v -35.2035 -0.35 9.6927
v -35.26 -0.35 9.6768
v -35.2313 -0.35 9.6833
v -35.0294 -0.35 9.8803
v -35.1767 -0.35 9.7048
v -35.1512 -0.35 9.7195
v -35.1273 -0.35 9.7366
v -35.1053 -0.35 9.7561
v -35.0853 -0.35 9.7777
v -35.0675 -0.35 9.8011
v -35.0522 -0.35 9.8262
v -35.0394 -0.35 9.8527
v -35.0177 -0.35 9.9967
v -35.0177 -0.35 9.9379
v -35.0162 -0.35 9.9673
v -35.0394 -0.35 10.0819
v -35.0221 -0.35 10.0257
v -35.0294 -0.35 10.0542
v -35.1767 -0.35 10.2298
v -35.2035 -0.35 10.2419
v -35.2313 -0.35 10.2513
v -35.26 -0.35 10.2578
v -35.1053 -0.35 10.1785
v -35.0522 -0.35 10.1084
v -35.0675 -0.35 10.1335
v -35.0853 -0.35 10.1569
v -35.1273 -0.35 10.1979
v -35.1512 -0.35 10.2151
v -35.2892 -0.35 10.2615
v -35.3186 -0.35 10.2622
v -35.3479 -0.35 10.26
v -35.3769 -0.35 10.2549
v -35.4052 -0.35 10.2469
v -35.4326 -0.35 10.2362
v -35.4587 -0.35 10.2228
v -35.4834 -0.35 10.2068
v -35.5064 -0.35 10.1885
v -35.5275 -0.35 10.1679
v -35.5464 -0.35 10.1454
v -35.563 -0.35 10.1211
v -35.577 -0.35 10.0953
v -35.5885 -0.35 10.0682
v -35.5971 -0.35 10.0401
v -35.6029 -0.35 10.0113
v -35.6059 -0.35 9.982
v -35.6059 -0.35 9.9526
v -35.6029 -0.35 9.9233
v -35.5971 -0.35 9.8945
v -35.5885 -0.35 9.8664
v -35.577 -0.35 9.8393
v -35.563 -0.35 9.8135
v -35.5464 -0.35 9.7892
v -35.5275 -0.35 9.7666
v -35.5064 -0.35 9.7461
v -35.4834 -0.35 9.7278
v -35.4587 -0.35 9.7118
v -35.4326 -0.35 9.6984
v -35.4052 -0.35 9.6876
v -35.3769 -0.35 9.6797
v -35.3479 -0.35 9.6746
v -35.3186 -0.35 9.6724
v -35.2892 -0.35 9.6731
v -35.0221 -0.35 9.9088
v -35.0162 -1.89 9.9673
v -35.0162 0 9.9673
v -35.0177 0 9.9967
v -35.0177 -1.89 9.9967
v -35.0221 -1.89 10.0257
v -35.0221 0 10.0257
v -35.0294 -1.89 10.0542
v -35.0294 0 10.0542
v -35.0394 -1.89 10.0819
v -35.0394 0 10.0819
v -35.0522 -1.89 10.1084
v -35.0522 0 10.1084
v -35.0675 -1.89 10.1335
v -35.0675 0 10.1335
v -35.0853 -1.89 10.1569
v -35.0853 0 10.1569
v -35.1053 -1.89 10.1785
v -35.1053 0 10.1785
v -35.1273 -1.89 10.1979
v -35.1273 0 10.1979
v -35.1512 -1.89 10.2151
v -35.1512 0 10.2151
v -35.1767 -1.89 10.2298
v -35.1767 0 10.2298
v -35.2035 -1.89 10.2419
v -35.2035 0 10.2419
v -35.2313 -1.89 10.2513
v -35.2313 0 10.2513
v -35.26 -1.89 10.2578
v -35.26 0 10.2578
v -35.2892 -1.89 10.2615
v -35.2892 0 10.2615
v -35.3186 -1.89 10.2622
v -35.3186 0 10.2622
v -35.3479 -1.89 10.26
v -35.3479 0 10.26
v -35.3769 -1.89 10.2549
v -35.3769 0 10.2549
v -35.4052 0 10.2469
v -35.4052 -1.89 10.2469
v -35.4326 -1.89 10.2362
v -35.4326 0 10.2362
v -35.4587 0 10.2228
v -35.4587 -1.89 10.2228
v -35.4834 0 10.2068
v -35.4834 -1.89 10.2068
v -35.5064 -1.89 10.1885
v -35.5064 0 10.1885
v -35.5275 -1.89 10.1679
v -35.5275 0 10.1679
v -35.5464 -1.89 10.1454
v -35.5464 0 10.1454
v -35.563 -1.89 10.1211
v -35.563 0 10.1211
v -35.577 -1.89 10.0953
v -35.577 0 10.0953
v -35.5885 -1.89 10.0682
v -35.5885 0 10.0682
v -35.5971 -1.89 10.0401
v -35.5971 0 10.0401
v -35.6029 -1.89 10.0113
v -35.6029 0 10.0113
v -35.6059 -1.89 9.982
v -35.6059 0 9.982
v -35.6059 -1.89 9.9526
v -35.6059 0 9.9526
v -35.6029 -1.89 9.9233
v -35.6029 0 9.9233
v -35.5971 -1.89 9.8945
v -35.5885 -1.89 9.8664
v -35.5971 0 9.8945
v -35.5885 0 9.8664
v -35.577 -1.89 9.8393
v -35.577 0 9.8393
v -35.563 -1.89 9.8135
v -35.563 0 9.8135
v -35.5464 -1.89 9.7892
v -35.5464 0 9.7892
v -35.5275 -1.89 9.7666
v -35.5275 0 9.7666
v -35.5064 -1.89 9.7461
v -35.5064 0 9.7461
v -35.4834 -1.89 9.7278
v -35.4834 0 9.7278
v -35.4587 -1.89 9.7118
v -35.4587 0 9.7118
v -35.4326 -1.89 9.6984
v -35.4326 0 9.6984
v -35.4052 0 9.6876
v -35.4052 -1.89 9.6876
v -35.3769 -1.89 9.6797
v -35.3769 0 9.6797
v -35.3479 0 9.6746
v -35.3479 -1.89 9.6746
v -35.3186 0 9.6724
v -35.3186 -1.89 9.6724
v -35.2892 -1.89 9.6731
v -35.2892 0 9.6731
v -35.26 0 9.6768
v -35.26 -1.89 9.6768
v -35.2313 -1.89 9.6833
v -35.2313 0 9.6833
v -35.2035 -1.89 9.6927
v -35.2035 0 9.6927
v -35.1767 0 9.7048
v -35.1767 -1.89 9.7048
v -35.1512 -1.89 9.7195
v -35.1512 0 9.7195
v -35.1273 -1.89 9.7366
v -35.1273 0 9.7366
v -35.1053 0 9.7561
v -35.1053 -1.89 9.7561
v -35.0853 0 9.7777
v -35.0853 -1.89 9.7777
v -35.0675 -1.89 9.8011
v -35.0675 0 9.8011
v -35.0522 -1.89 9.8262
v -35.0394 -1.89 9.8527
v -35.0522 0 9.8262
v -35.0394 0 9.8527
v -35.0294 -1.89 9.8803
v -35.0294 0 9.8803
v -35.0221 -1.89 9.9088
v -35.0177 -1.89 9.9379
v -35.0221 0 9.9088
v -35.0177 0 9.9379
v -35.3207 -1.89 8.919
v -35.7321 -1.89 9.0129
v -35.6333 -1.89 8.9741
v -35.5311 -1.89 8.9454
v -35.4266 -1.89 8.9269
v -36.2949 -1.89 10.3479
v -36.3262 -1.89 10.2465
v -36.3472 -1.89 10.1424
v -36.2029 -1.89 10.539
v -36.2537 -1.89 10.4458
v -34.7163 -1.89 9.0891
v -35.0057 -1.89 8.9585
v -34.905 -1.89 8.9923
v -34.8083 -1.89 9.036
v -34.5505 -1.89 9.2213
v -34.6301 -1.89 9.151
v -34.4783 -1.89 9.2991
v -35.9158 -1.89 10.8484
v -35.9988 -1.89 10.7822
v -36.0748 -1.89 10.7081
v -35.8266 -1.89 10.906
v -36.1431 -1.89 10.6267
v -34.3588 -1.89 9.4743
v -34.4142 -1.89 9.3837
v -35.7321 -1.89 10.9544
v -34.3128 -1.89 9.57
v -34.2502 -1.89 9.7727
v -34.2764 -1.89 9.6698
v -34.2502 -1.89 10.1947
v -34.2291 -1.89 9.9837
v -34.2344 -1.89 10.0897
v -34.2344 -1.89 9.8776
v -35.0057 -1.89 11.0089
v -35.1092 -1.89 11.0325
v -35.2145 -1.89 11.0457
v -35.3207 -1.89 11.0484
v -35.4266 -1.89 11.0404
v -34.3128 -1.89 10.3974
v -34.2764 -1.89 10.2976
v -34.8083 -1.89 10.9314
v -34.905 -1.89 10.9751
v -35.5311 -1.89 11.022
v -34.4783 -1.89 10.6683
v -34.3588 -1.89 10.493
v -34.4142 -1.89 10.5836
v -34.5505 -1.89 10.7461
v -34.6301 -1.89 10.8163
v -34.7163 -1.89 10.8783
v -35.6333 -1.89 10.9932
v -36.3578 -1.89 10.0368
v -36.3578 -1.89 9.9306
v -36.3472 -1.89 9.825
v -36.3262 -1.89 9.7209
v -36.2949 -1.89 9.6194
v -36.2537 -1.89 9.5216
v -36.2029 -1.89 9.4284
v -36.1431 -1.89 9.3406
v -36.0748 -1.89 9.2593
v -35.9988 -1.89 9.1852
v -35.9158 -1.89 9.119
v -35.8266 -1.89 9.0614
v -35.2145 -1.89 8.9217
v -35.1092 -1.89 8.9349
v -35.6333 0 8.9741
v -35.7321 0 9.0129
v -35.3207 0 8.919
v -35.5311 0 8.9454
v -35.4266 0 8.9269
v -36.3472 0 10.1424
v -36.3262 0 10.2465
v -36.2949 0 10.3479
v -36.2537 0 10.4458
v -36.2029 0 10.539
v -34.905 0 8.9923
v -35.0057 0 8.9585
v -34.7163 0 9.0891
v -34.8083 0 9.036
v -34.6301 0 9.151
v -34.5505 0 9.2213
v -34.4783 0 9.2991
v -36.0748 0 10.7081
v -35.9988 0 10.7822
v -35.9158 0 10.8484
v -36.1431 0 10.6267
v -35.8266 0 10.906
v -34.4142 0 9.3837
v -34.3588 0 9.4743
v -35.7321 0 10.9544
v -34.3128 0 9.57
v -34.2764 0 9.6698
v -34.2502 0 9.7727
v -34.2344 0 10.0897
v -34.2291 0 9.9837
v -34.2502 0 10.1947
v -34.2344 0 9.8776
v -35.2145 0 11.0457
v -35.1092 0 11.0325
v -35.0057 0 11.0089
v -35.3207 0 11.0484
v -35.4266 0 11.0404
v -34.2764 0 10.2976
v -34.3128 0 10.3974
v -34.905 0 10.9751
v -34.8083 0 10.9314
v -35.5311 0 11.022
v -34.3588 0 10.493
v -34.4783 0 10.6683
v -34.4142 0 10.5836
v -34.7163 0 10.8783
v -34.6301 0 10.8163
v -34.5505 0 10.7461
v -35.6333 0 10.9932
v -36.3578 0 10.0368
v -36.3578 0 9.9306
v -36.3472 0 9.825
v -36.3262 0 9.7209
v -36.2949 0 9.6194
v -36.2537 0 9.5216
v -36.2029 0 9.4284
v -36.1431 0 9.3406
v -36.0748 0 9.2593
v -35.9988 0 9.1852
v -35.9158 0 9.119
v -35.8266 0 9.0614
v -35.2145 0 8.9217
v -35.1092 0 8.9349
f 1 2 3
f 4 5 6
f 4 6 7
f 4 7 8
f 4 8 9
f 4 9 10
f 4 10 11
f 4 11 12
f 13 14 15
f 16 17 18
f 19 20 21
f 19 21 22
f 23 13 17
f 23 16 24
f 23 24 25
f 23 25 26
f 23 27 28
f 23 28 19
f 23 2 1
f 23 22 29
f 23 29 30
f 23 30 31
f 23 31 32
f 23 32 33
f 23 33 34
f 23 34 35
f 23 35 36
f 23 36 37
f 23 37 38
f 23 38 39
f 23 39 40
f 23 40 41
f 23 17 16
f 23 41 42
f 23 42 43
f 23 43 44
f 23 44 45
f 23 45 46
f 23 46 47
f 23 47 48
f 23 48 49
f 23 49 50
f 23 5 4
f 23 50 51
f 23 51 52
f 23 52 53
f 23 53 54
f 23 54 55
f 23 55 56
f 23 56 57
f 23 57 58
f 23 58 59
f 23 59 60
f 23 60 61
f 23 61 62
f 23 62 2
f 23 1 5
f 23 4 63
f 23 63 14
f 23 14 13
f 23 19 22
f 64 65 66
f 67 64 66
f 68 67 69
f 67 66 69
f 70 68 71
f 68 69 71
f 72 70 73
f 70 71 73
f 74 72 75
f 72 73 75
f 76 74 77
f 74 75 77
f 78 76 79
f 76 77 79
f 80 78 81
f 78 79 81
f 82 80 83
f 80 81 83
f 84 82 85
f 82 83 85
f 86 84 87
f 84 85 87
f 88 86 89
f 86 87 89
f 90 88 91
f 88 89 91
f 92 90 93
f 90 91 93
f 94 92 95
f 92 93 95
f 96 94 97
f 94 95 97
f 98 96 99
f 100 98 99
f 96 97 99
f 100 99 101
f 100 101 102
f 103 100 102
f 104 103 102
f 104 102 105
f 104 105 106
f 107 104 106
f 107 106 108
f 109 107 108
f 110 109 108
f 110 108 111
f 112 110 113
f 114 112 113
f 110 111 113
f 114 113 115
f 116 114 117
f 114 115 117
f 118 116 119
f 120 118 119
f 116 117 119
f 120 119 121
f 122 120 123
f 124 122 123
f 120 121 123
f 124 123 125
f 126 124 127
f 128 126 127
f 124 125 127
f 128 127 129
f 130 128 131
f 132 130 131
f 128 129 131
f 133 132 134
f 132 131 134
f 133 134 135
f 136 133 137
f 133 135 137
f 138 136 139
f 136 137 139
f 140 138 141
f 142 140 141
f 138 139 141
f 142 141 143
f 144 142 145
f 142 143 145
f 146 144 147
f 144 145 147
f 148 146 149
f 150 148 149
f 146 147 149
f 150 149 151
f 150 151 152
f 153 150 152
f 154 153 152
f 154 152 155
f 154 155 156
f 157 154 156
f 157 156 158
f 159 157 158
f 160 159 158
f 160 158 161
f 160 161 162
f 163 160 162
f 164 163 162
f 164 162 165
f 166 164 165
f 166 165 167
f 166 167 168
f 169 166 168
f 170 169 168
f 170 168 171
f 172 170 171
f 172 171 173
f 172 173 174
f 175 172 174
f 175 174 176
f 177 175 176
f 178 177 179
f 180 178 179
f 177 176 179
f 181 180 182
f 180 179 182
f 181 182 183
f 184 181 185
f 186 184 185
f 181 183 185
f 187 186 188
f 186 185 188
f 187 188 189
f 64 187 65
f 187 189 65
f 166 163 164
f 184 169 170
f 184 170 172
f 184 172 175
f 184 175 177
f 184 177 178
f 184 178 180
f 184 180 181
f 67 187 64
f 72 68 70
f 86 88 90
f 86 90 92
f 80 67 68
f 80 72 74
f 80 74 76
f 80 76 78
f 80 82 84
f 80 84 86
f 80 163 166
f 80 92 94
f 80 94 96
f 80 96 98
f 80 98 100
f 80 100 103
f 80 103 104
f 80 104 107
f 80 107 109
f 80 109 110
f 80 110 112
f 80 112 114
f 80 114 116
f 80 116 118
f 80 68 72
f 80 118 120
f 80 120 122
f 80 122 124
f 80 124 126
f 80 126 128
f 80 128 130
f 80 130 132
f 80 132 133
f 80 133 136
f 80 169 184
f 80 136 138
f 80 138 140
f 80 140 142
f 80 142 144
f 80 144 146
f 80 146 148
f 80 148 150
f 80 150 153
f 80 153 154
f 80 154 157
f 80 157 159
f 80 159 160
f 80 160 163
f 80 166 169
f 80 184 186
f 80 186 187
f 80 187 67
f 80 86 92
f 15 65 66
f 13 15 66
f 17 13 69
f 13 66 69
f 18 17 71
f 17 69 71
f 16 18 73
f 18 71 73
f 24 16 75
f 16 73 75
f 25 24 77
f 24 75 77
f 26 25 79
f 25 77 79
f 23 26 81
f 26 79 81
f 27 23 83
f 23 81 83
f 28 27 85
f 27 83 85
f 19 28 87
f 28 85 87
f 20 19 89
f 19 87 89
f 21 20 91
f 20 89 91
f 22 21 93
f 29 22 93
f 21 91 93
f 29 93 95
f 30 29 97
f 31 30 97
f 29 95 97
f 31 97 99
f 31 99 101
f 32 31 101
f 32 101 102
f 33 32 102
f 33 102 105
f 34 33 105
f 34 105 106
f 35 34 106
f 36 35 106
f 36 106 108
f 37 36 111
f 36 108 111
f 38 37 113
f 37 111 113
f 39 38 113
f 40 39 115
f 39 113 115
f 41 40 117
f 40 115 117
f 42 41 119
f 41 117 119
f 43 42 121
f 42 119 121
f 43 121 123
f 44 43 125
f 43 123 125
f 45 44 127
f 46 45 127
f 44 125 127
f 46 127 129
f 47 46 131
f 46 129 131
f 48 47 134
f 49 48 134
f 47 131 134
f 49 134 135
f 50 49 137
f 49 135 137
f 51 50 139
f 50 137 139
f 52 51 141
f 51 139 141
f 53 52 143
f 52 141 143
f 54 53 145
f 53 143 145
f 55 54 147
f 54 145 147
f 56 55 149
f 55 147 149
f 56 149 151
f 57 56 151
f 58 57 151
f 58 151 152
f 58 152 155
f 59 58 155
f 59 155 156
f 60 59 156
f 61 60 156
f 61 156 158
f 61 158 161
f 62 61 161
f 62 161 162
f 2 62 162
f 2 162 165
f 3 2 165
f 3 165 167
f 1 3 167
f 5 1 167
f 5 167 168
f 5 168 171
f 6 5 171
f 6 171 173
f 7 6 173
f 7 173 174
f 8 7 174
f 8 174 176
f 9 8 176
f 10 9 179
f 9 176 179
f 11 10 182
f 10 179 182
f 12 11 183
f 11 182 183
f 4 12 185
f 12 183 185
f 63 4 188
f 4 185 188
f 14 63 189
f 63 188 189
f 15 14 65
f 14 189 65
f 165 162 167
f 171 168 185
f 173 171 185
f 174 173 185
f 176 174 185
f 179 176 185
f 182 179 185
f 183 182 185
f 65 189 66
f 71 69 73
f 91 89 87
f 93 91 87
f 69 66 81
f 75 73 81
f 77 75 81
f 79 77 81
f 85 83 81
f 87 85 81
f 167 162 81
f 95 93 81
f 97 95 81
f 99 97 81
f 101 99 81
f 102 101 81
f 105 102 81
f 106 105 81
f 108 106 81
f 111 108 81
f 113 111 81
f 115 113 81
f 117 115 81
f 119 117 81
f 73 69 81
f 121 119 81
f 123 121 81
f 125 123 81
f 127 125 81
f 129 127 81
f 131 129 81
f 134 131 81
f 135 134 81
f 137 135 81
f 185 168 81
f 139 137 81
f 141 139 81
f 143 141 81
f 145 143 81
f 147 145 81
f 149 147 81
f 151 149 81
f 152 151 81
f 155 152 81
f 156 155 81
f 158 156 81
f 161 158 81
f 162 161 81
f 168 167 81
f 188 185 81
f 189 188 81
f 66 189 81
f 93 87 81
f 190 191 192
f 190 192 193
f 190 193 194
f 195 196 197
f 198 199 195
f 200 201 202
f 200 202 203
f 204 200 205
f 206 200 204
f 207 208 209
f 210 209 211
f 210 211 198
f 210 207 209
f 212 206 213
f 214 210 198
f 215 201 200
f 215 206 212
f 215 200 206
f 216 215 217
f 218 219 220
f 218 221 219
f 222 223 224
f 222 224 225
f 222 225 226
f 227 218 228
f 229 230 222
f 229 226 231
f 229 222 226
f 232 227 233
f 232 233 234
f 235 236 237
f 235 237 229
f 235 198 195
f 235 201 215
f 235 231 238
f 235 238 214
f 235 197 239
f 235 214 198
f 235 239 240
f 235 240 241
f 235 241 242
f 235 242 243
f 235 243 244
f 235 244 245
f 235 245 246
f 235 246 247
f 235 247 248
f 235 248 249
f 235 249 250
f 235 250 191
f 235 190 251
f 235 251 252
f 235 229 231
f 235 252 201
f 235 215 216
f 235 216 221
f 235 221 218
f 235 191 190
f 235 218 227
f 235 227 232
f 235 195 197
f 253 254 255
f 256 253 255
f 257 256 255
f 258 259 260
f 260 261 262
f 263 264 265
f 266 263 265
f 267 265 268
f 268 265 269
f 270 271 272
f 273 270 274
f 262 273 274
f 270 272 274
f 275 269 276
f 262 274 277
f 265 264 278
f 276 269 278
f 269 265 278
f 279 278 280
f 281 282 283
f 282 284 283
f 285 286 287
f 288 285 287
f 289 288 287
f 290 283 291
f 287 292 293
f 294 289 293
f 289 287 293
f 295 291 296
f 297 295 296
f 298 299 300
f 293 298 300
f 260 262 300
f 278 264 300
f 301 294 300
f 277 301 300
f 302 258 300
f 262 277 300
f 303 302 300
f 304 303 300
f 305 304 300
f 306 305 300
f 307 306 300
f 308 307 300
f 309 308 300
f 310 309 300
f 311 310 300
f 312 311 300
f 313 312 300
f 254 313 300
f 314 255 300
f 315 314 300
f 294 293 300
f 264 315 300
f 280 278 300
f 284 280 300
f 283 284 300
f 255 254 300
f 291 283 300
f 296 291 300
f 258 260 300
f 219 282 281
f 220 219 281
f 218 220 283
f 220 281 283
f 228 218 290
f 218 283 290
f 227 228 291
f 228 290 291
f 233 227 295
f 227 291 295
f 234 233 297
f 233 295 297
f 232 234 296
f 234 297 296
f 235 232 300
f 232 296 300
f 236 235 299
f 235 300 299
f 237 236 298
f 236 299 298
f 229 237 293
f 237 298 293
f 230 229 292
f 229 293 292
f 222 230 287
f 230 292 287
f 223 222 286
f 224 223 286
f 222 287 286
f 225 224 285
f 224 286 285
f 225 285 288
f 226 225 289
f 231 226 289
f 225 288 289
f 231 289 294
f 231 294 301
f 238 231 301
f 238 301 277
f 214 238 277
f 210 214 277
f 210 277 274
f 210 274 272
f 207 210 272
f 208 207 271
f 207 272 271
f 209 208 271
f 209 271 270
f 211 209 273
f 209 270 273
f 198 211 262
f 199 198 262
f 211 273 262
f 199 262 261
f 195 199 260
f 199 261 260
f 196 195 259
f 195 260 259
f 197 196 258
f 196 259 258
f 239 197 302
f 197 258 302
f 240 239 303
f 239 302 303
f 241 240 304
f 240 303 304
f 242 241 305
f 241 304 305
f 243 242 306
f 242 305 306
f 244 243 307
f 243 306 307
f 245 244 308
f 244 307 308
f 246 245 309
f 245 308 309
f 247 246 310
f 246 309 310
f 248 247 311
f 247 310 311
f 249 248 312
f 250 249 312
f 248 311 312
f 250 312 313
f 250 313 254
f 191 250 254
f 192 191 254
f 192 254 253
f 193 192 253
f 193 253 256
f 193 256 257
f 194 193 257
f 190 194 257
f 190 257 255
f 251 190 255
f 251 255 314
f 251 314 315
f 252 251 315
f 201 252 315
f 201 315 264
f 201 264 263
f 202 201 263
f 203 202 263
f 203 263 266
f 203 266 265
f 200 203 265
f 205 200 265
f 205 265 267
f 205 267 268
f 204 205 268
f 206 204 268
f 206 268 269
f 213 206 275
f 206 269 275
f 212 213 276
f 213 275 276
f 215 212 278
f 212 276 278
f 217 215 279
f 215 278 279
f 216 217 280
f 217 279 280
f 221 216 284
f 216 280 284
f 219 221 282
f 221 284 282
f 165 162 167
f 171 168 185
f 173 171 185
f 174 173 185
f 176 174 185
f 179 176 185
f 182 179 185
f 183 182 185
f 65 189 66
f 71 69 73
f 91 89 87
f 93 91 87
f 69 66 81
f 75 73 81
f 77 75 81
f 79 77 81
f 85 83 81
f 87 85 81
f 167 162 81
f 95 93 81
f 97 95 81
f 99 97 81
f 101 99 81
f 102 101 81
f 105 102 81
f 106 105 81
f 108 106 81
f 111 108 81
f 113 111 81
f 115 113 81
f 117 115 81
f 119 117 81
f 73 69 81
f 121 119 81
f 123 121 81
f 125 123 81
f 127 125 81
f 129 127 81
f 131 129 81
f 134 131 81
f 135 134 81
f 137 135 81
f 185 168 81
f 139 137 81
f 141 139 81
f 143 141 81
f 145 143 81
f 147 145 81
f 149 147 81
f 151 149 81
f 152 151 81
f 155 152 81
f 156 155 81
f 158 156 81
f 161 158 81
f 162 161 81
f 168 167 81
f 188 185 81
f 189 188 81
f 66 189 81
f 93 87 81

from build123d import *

# Parameters (mm, degrees)
F1_R     = 0.295
F2_DEPTH = 1.89
F0_R     = 1.065
F3_DEPTH = 0.35


with BuildPart() as f2:
    # F1 (on face) → F2 (new body)
    with BuildSketch(Plane.XZ):
        with Locations((-35.3112444282, 9.9672842771)):
            Circle(F1_R)
    extrude(amount=F2_DEPTH)


with BuildPart() as f2b:
    # F0 (on Front) → F2, piece 2 (new body)
    with BuildSketch(Plane.XZ):
        with Locations((-35.2941267192, 9.983683005)):
            Circle(F0_R)
    extrude(amount=F2_DEPTH)


with BuildPart() as f3:
    # F1 (on face) → F3 (new body)
    with BuildSketch(Plane.XZ):
        with Locations((-35.3112444282, 9.9672842771)):
            Circle(F1_R)
    extrude(amount=F3_DEPTH)


solid = Compound([f2.part, f2b.part, f3.part])
